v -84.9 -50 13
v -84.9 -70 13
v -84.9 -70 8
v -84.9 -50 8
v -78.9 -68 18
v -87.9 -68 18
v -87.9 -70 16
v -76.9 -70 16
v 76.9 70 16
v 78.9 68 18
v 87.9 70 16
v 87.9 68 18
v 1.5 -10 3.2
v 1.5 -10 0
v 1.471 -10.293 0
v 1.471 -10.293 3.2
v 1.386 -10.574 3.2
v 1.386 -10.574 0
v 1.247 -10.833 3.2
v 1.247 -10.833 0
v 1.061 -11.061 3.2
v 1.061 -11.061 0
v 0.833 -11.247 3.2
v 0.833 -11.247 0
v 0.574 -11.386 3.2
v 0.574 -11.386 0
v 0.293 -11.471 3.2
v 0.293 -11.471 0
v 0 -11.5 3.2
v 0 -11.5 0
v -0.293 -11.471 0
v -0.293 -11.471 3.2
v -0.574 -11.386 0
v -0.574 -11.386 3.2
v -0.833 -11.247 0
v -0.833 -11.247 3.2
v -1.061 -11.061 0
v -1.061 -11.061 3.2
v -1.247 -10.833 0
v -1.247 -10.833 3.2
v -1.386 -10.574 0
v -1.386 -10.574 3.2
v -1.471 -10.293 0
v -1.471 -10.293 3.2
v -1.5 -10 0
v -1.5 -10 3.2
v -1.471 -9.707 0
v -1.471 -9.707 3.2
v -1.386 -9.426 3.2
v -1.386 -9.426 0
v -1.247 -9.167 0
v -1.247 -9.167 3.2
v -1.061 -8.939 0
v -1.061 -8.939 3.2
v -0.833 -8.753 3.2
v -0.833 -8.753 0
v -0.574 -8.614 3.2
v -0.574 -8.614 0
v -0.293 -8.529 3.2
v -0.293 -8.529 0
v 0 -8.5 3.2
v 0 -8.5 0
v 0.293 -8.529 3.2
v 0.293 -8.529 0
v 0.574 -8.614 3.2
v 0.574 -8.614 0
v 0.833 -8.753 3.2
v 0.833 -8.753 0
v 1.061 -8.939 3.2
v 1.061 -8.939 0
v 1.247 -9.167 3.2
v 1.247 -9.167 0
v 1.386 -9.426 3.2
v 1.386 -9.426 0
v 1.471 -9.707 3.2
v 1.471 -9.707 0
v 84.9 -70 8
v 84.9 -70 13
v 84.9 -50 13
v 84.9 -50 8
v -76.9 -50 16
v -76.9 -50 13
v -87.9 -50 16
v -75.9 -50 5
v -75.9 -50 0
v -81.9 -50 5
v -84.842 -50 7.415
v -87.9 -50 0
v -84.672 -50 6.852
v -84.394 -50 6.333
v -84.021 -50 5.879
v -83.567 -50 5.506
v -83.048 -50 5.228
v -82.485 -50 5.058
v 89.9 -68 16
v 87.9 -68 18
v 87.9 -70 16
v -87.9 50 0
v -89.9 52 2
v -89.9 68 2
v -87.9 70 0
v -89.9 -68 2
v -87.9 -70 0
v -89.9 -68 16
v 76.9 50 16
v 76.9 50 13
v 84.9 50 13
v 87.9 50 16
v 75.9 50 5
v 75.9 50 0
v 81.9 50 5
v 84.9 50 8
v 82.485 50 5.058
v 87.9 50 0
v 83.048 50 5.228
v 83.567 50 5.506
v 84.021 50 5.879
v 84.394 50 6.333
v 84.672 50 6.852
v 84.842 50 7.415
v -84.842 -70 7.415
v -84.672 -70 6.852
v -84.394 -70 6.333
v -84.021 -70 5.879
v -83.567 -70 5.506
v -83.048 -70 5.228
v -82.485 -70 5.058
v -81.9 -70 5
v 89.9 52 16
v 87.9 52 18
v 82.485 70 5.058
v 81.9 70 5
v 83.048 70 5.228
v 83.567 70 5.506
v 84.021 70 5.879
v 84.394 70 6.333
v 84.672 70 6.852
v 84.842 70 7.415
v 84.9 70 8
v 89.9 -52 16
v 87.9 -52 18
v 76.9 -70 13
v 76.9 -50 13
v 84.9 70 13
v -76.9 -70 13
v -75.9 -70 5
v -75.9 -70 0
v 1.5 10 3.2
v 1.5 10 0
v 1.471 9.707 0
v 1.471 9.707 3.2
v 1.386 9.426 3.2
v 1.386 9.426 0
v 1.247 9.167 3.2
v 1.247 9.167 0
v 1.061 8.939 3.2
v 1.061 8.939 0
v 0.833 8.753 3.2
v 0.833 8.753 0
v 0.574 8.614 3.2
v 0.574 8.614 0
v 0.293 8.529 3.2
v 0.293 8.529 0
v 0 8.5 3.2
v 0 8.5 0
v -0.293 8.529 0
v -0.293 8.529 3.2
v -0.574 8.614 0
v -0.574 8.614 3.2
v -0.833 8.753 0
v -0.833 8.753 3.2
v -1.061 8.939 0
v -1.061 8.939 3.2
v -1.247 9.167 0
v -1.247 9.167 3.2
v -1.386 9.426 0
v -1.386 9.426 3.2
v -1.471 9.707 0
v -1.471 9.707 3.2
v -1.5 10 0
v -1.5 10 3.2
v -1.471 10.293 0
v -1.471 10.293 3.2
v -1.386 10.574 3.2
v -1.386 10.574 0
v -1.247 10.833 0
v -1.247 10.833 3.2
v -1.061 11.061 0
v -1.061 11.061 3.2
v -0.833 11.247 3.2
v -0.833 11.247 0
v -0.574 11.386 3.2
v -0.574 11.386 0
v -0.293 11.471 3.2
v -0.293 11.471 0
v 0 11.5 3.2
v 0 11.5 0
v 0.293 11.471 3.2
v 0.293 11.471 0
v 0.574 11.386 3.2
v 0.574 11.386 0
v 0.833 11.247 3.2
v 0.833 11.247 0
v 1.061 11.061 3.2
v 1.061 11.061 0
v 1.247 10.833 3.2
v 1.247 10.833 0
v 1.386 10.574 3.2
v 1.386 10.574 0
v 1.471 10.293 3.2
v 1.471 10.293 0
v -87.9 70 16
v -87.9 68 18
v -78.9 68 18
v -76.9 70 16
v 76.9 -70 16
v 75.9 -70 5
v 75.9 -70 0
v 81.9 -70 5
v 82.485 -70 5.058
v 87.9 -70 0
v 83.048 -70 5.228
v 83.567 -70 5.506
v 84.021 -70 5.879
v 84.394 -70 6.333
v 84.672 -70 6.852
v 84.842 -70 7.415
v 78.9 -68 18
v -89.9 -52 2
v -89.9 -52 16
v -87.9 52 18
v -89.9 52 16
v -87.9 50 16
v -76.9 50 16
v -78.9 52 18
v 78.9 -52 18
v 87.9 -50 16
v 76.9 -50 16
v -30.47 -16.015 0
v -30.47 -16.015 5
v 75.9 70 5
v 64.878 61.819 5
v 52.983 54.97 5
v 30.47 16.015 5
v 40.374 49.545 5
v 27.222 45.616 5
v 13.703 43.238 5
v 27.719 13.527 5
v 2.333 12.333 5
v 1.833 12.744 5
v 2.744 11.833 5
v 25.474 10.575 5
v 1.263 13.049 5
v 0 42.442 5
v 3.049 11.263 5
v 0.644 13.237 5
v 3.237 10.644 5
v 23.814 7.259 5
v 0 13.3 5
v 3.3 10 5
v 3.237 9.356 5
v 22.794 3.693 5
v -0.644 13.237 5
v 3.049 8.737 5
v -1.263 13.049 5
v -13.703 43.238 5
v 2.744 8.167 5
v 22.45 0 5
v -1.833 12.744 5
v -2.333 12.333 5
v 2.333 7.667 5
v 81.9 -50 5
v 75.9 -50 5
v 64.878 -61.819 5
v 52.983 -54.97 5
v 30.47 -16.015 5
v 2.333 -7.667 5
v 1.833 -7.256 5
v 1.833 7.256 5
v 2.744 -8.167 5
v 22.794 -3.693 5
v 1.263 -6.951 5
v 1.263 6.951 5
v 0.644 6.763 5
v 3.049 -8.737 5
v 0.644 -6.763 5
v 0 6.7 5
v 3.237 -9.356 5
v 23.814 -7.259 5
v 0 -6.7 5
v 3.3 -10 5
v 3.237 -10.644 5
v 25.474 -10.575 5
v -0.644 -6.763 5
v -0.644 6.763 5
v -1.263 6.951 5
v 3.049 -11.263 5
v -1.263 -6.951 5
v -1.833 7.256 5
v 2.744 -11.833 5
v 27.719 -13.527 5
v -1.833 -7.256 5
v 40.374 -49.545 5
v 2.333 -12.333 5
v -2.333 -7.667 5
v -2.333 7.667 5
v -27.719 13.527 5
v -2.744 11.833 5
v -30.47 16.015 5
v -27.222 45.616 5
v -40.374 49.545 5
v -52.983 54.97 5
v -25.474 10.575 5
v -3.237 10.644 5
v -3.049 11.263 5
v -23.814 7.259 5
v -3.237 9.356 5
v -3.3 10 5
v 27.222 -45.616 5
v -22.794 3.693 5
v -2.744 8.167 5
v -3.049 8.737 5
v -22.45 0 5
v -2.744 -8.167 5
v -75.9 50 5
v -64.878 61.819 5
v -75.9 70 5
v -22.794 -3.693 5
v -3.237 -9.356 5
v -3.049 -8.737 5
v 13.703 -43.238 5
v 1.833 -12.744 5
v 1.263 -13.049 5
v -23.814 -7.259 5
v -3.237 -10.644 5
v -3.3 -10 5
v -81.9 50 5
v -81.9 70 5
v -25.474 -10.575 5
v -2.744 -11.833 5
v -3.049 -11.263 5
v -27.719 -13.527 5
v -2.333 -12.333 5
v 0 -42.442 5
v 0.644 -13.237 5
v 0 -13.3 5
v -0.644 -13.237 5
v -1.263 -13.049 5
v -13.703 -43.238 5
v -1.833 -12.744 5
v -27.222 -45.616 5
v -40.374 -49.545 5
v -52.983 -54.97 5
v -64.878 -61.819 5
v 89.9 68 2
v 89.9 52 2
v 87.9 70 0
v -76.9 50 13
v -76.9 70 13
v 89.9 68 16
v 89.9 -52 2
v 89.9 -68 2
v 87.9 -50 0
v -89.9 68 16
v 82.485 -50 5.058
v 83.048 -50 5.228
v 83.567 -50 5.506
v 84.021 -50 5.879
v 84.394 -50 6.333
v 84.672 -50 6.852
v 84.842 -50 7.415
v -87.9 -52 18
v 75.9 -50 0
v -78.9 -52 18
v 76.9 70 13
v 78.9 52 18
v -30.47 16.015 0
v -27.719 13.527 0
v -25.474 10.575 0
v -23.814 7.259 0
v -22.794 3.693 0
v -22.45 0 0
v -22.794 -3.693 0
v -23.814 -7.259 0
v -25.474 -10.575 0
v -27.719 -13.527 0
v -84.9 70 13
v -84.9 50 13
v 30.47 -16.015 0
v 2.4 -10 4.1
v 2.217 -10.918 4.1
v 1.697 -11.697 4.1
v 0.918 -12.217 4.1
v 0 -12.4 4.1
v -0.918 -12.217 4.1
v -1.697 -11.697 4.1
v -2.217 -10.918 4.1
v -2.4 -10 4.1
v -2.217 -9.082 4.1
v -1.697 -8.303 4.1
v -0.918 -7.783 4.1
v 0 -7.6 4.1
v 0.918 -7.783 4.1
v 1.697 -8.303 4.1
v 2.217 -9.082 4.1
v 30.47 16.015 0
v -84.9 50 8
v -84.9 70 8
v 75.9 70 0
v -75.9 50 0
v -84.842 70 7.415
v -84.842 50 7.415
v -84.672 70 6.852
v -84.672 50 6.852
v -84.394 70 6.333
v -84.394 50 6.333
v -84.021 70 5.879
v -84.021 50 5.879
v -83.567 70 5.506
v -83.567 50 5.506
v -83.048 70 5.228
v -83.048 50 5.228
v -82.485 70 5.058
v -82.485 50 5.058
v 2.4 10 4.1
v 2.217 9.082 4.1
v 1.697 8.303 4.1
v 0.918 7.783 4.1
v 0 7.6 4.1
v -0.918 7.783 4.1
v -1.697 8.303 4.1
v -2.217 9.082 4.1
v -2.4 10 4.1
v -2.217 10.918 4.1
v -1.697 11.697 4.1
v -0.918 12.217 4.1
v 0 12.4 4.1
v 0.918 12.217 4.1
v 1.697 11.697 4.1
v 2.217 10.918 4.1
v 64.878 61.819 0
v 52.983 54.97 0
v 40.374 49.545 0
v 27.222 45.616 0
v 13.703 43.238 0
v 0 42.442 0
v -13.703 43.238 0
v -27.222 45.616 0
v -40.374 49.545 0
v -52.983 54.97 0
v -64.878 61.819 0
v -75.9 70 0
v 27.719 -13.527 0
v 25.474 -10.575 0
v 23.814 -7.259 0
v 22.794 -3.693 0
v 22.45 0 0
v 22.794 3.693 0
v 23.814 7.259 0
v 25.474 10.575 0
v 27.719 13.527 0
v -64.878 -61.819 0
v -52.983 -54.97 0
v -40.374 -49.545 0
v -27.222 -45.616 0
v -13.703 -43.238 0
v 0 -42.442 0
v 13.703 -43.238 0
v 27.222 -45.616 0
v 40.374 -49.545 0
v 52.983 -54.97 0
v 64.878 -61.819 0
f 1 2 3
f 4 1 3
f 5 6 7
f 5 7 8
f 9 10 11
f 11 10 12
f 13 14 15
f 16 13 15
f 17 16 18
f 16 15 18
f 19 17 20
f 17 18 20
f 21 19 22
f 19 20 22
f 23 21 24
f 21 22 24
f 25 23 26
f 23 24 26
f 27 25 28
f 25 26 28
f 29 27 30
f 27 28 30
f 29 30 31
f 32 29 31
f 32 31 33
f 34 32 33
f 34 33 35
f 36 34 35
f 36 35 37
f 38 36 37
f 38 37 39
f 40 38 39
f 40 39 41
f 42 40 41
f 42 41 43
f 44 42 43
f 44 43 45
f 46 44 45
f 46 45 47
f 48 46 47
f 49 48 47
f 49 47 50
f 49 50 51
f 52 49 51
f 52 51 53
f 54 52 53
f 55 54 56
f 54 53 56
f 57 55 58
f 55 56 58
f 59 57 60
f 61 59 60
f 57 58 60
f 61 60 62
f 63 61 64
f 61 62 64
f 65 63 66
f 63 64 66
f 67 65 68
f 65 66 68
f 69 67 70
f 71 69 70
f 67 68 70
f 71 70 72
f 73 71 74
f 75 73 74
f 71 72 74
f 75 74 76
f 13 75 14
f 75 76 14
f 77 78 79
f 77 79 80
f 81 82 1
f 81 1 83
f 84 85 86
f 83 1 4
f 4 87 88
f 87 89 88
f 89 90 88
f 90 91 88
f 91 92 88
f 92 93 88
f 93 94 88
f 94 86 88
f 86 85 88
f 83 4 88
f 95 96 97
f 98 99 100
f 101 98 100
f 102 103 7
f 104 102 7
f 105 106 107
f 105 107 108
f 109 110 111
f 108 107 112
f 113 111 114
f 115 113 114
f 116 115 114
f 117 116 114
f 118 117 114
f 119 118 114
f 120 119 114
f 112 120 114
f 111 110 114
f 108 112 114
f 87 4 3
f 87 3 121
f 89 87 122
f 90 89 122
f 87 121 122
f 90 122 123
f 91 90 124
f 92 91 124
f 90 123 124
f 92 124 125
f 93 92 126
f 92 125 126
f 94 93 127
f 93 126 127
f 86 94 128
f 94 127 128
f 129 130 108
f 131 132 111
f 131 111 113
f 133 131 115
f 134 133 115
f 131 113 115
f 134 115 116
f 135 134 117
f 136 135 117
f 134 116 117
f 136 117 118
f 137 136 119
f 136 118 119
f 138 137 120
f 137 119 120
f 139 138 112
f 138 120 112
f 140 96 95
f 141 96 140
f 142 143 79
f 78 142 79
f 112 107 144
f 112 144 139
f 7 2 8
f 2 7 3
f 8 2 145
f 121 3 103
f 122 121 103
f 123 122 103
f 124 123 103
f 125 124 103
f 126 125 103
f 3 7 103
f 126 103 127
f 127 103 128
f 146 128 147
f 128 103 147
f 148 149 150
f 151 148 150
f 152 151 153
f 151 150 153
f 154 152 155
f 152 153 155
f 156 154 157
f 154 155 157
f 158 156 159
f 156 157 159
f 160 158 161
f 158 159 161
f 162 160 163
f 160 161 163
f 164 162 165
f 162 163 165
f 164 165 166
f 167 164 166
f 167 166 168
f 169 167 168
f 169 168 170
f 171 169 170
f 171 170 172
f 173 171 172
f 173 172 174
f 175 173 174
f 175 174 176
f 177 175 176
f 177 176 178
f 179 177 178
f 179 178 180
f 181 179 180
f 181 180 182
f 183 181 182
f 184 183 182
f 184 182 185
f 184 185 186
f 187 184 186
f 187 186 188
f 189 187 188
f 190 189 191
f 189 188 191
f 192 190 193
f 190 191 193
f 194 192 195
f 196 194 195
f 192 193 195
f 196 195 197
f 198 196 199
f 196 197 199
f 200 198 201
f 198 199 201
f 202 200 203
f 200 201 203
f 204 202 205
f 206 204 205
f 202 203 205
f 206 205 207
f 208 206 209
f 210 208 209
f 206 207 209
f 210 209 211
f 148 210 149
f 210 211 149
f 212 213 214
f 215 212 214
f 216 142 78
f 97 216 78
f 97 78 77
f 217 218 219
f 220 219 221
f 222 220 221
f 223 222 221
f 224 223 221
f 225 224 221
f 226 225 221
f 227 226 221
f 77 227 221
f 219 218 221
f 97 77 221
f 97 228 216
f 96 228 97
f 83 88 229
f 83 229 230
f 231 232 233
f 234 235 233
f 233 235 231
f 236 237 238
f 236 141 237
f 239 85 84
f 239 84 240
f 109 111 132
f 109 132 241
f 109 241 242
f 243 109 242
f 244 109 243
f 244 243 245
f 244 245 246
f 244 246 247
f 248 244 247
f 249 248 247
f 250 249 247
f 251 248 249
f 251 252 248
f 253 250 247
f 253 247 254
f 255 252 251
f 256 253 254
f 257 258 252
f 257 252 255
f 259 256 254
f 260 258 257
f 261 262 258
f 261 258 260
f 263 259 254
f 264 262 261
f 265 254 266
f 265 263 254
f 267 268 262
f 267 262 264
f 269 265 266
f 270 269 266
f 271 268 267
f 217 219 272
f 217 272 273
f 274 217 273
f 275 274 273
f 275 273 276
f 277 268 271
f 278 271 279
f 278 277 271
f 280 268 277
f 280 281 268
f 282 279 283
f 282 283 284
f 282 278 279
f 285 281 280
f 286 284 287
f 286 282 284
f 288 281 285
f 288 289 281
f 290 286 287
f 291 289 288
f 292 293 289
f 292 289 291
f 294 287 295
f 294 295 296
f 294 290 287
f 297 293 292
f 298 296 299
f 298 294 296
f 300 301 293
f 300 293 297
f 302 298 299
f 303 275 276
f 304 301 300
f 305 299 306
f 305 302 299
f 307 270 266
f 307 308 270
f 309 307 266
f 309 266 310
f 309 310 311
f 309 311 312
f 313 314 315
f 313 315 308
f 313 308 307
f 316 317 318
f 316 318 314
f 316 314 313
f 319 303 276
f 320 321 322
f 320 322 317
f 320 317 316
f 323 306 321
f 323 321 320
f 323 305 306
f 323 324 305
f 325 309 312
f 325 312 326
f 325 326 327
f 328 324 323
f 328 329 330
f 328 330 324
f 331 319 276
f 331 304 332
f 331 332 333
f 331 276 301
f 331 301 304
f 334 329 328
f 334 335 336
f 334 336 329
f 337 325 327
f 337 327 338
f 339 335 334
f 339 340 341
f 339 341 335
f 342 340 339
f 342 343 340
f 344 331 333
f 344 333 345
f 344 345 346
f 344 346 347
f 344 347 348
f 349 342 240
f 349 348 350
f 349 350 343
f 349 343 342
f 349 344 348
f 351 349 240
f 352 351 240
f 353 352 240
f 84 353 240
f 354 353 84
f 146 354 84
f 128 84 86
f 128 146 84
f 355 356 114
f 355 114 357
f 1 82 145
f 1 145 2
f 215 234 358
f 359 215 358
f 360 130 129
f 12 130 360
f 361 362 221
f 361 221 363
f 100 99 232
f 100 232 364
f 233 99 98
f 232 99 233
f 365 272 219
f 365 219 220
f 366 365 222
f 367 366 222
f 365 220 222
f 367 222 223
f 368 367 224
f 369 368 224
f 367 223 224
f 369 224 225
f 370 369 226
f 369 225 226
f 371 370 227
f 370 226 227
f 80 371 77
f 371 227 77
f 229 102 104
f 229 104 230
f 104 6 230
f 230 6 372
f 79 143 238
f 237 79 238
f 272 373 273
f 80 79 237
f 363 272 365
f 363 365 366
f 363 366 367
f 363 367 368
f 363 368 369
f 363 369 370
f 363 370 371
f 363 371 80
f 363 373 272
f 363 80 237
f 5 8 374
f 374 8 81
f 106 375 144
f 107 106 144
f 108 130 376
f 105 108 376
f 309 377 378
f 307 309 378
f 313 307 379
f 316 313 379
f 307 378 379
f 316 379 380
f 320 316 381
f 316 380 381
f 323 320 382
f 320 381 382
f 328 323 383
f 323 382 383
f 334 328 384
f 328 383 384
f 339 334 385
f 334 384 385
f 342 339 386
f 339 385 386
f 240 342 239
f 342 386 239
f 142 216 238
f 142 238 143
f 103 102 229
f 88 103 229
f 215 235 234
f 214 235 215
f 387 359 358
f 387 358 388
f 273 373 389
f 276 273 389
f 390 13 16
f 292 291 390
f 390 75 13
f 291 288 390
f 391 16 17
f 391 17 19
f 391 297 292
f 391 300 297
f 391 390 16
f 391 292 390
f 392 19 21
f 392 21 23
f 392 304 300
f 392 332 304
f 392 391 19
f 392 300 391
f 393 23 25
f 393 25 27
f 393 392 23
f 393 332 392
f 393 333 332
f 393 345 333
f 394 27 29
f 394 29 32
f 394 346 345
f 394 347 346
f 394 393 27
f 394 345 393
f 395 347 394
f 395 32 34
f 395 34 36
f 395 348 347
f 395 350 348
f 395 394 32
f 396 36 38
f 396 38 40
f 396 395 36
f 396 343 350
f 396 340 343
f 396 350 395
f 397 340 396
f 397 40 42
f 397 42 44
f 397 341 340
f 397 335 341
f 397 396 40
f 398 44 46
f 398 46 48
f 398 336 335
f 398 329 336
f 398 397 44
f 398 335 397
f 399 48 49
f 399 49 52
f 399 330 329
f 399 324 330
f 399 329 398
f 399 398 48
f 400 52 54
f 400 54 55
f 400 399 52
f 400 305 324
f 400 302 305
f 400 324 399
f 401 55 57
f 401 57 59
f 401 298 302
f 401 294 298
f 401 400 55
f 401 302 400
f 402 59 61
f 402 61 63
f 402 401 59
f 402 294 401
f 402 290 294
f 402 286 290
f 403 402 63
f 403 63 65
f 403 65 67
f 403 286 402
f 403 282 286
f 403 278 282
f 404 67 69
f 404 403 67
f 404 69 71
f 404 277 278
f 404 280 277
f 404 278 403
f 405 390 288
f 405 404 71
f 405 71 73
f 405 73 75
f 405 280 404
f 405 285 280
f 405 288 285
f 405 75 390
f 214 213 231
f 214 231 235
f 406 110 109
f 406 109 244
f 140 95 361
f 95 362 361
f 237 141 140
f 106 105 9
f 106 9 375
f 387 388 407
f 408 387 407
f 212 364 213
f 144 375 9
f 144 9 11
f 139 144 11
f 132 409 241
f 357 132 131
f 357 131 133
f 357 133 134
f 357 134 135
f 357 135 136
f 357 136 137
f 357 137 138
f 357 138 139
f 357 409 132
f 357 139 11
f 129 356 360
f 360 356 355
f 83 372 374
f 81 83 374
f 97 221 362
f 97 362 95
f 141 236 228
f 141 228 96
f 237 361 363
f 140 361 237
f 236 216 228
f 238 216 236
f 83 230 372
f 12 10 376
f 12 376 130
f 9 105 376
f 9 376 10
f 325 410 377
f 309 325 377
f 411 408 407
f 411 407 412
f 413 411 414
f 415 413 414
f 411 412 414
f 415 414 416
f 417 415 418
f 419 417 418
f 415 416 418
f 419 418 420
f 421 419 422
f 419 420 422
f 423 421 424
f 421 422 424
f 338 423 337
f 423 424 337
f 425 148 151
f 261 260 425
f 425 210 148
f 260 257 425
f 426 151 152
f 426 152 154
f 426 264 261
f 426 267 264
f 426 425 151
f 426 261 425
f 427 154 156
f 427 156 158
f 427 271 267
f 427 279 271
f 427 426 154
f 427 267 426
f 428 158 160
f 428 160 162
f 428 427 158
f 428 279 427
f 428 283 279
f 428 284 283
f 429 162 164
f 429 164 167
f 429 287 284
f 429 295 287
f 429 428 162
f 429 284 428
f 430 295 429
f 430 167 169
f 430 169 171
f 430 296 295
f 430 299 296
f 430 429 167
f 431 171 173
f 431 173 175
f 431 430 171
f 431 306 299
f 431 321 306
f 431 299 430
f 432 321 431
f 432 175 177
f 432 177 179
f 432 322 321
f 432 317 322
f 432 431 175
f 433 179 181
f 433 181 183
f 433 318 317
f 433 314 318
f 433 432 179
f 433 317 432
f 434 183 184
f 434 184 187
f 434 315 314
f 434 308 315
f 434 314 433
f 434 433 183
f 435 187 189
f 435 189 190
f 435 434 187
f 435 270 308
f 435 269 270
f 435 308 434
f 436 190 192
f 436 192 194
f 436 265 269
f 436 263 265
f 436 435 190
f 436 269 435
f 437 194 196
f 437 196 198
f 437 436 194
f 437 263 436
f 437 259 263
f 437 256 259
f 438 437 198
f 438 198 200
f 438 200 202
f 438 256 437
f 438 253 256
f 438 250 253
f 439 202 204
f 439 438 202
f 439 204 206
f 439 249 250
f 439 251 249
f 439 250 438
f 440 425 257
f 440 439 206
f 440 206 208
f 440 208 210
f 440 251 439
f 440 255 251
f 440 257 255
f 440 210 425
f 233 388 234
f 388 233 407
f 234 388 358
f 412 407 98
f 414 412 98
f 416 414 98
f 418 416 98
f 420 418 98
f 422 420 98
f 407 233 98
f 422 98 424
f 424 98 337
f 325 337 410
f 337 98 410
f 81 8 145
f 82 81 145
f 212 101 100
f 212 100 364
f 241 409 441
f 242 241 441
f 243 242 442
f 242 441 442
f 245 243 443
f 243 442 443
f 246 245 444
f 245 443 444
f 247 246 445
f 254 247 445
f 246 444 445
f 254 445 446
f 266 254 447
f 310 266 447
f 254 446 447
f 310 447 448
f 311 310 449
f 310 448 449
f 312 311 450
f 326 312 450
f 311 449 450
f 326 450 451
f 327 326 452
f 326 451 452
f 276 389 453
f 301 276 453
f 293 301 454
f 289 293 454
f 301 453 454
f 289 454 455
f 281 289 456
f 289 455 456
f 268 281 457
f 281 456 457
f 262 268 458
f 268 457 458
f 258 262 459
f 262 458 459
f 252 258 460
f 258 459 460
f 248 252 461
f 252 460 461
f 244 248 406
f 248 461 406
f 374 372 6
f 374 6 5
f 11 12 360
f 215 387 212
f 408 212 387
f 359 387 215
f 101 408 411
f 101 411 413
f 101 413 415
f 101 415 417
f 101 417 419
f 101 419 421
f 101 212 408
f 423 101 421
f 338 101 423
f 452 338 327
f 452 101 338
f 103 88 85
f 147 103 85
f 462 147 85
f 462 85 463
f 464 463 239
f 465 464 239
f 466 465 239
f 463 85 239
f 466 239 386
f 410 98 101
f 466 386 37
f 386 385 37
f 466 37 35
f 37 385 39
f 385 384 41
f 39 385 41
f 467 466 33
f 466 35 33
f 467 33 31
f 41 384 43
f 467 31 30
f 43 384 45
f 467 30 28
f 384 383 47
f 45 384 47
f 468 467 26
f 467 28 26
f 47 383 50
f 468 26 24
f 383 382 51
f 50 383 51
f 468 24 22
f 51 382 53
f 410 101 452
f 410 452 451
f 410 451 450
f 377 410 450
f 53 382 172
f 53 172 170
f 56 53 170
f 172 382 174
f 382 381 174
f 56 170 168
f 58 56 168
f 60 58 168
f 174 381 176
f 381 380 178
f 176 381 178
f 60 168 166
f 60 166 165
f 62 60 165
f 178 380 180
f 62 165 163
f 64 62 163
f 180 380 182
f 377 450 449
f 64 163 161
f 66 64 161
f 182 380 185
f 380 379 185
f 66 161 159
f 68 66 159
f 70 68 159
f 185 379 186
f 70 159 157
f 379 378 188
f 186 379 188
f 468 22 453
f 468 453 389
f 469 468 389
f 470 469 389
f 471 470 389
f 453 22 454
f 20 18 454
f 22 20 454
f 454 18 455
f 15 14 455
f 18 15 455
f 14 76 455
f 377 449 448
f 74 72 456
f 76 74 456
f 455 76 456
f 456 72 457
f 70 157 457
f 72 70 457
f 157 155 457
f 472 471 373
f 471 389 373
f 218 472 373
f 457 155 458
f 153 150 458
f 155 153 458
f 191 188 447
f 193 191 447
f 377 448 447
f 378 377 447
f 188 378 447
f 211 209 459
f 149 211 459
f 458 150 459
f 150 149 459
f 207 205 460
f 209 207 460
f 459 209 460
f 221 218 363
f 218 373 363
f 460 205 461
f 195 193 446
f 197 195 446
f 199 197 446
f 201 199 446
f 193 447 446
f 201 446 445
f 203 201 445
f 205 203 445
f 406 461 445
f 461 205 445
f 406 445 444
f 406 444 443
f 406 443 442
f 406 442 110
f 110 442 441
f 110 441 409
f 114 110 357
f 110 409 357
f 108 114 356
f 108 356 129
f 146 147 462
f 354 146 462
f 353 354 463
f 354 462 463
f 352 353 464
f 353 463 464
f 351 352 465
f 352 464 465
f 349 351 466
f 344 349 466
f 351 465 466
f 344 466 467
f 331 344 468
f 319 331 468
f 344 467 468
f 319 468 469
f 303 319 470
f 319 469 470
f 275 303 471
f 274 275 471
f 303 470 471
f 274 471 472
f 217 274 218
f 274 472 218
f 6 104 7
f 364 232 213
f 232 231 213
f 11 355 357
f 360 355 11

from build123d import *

# Parameters (mm, degrees)
SKETCH019_W     = 179.8
SKETCH019_H     = 140
PAD006_DEPTH    = 18
POCKET005_DEPTH = 140.001
SKETCH020_R     = 1.5
POCKET006_DEPTH = 18.001
CHAMFER004_SIZE = 1.8
CHAMFER009_SIZE = 2


with BuildPart() as part:
    # Sketch019 → Pad006 (new body)
    with BuildSketch(Plane.XY):
        Rectangle(SKETCH019_W, SKETCH019_H)
    extrude(amount=PAD006_DEPTH)

    # Sketch017 (on Face3 of Pad006) → Pocket005 (cut, through all)
    with BuildSketch(Plane.XZ.offset(70)):
        with BuildLine():
            Line((-76.9, 18), (76.9, 18))
            Line((76.9, 18), (76.9, 13))
            Line((76.9, 13), (84.9, 13))
            Line((84.9, 13), (84.9, 8))
            ThreePointArc((81.9, 5), (84.0213203436, 5.8786796564), (84.9, 8))
            Line((81.9, 5), (-81.9, 5))
            ThreePointArc((-84.9, 8), (-84.0213203436, 5.8786796564), (-81.9, 5))
            Line((-84.9, 13), (-84.9, 8))
            Line((-76.9, 13), (-84.9, 13))
            Line((-76.9, 18), (-76.9, 13))
        make_face()
    extrude(amount=-POCKET005_DEPTH, mode=Mode.SUBTRACT)

    # Sketch020 (on Face2 of Pocket005) → Pocket006 (cut, through all)
    with BuildSketch(Plane(origin=(0, 0, 0), x_dir=(1, 0, 0), z_dir=(0, 0, -1))):
        with Locations((0, -10)):
            Circle(SKETCH020_R)
        with Locations((0, 10)):
            Circle(SKETCH020_R)
        with BuildLine():
            Line((-75.9, -70), (75.9, -70))
            ThreePointArc((75.9, -70), (0, -42.4418315883), (-75.9, -70))
        make_face()
        with BuildLine():
            Line((75.9, 50), (30.4697456096, 16.0147901872))
            ThreePointArc((30.4697456096, 16.0147901872), (22.45, 0), (30.4697456096, -16.0147901872))
            Line((75.9, -50), (30.4697456096, -16.0147901872))
            Line((75.9, -50), (89.9, -50))
            Line((89.9, 50), (89.9, -50))
            Line((75.9, 50), (89.9, 50))
        make_face()
        with BuildLine():
            ThreePointArc((-30.4697456096, -16.0147901872), (-22.45, 0), (-30.4697456096, 16.0147901872))
            Line((-75.9, 50), (-30.4697456096, 16.0147901872))
            Line((-75.9, 50), (-89.9, 50))
            Line((-89.9, 50), (-89.9, -50))
            Line((-89.9, -50), (-75.9, -50))
            Line((-75.9, -50), (-30.4697456096, -16.0147901872))
        make_face()
        with BuildLine():
            Line((-75.9, 70), (75.9, 70))
            ThreePointArc((-75.9, 70), (0, 42.4418315883), (75.9, 70))
        make_face()
    extrude(amount=-POCKET006_DEPTH, mode=Mode.SUBTRACT)

    # Chamfer004
    chamfer004_edges = [part.edges().sort_by_distance(p)[0] for p in [
        (-1.5, -10, 5),
        (-1.5, 10, 5),
    ]]
    chamfer(chamfer004_edges, length=CHAMFER004_SIZE)

    # Chamfer009
    chamfer009_edges = [part.edges().sort_by_distance(p)[0] for p in [
        (83.4, 70, 18),
        (89.9, 60, 18),
        (83.4, 50, 18),
        (76.9, 60, 18),
        (89.9, 60, 0),
        (89.9, 50, 9),
        (89.9, 70, 9),
        (83.4, -50, 18),
        (89.9, -60, 18),
        (83.4, -70, 18),
        (76.9, -60, 18),
        (89.9, -60, 0),
        (89.9, -70, 9),
        (89.9, -50, 9),
        (-89.9, 60, 0),
        (-89.9, 70, 9),
        (-89.9, 60, 18),
        (-89.9, 50, 9),
        (-89.9, -60, 0),
        (-89.9, -50, 9),
        (-89.9, -60, 18),
        (-89.9, -70, 9),
        (-83.4, -50, 18),
        (-76.9, -60, 18),
        (-83.4, -70, 18),
        (-83.4, 70, 18),
        (-76.9, 60, 18),
        (-83.4, 50, 18),
    ]]
    chamfer(chamfer009_edges, length=CHAMFER009_SIZE)


solid = part.part
